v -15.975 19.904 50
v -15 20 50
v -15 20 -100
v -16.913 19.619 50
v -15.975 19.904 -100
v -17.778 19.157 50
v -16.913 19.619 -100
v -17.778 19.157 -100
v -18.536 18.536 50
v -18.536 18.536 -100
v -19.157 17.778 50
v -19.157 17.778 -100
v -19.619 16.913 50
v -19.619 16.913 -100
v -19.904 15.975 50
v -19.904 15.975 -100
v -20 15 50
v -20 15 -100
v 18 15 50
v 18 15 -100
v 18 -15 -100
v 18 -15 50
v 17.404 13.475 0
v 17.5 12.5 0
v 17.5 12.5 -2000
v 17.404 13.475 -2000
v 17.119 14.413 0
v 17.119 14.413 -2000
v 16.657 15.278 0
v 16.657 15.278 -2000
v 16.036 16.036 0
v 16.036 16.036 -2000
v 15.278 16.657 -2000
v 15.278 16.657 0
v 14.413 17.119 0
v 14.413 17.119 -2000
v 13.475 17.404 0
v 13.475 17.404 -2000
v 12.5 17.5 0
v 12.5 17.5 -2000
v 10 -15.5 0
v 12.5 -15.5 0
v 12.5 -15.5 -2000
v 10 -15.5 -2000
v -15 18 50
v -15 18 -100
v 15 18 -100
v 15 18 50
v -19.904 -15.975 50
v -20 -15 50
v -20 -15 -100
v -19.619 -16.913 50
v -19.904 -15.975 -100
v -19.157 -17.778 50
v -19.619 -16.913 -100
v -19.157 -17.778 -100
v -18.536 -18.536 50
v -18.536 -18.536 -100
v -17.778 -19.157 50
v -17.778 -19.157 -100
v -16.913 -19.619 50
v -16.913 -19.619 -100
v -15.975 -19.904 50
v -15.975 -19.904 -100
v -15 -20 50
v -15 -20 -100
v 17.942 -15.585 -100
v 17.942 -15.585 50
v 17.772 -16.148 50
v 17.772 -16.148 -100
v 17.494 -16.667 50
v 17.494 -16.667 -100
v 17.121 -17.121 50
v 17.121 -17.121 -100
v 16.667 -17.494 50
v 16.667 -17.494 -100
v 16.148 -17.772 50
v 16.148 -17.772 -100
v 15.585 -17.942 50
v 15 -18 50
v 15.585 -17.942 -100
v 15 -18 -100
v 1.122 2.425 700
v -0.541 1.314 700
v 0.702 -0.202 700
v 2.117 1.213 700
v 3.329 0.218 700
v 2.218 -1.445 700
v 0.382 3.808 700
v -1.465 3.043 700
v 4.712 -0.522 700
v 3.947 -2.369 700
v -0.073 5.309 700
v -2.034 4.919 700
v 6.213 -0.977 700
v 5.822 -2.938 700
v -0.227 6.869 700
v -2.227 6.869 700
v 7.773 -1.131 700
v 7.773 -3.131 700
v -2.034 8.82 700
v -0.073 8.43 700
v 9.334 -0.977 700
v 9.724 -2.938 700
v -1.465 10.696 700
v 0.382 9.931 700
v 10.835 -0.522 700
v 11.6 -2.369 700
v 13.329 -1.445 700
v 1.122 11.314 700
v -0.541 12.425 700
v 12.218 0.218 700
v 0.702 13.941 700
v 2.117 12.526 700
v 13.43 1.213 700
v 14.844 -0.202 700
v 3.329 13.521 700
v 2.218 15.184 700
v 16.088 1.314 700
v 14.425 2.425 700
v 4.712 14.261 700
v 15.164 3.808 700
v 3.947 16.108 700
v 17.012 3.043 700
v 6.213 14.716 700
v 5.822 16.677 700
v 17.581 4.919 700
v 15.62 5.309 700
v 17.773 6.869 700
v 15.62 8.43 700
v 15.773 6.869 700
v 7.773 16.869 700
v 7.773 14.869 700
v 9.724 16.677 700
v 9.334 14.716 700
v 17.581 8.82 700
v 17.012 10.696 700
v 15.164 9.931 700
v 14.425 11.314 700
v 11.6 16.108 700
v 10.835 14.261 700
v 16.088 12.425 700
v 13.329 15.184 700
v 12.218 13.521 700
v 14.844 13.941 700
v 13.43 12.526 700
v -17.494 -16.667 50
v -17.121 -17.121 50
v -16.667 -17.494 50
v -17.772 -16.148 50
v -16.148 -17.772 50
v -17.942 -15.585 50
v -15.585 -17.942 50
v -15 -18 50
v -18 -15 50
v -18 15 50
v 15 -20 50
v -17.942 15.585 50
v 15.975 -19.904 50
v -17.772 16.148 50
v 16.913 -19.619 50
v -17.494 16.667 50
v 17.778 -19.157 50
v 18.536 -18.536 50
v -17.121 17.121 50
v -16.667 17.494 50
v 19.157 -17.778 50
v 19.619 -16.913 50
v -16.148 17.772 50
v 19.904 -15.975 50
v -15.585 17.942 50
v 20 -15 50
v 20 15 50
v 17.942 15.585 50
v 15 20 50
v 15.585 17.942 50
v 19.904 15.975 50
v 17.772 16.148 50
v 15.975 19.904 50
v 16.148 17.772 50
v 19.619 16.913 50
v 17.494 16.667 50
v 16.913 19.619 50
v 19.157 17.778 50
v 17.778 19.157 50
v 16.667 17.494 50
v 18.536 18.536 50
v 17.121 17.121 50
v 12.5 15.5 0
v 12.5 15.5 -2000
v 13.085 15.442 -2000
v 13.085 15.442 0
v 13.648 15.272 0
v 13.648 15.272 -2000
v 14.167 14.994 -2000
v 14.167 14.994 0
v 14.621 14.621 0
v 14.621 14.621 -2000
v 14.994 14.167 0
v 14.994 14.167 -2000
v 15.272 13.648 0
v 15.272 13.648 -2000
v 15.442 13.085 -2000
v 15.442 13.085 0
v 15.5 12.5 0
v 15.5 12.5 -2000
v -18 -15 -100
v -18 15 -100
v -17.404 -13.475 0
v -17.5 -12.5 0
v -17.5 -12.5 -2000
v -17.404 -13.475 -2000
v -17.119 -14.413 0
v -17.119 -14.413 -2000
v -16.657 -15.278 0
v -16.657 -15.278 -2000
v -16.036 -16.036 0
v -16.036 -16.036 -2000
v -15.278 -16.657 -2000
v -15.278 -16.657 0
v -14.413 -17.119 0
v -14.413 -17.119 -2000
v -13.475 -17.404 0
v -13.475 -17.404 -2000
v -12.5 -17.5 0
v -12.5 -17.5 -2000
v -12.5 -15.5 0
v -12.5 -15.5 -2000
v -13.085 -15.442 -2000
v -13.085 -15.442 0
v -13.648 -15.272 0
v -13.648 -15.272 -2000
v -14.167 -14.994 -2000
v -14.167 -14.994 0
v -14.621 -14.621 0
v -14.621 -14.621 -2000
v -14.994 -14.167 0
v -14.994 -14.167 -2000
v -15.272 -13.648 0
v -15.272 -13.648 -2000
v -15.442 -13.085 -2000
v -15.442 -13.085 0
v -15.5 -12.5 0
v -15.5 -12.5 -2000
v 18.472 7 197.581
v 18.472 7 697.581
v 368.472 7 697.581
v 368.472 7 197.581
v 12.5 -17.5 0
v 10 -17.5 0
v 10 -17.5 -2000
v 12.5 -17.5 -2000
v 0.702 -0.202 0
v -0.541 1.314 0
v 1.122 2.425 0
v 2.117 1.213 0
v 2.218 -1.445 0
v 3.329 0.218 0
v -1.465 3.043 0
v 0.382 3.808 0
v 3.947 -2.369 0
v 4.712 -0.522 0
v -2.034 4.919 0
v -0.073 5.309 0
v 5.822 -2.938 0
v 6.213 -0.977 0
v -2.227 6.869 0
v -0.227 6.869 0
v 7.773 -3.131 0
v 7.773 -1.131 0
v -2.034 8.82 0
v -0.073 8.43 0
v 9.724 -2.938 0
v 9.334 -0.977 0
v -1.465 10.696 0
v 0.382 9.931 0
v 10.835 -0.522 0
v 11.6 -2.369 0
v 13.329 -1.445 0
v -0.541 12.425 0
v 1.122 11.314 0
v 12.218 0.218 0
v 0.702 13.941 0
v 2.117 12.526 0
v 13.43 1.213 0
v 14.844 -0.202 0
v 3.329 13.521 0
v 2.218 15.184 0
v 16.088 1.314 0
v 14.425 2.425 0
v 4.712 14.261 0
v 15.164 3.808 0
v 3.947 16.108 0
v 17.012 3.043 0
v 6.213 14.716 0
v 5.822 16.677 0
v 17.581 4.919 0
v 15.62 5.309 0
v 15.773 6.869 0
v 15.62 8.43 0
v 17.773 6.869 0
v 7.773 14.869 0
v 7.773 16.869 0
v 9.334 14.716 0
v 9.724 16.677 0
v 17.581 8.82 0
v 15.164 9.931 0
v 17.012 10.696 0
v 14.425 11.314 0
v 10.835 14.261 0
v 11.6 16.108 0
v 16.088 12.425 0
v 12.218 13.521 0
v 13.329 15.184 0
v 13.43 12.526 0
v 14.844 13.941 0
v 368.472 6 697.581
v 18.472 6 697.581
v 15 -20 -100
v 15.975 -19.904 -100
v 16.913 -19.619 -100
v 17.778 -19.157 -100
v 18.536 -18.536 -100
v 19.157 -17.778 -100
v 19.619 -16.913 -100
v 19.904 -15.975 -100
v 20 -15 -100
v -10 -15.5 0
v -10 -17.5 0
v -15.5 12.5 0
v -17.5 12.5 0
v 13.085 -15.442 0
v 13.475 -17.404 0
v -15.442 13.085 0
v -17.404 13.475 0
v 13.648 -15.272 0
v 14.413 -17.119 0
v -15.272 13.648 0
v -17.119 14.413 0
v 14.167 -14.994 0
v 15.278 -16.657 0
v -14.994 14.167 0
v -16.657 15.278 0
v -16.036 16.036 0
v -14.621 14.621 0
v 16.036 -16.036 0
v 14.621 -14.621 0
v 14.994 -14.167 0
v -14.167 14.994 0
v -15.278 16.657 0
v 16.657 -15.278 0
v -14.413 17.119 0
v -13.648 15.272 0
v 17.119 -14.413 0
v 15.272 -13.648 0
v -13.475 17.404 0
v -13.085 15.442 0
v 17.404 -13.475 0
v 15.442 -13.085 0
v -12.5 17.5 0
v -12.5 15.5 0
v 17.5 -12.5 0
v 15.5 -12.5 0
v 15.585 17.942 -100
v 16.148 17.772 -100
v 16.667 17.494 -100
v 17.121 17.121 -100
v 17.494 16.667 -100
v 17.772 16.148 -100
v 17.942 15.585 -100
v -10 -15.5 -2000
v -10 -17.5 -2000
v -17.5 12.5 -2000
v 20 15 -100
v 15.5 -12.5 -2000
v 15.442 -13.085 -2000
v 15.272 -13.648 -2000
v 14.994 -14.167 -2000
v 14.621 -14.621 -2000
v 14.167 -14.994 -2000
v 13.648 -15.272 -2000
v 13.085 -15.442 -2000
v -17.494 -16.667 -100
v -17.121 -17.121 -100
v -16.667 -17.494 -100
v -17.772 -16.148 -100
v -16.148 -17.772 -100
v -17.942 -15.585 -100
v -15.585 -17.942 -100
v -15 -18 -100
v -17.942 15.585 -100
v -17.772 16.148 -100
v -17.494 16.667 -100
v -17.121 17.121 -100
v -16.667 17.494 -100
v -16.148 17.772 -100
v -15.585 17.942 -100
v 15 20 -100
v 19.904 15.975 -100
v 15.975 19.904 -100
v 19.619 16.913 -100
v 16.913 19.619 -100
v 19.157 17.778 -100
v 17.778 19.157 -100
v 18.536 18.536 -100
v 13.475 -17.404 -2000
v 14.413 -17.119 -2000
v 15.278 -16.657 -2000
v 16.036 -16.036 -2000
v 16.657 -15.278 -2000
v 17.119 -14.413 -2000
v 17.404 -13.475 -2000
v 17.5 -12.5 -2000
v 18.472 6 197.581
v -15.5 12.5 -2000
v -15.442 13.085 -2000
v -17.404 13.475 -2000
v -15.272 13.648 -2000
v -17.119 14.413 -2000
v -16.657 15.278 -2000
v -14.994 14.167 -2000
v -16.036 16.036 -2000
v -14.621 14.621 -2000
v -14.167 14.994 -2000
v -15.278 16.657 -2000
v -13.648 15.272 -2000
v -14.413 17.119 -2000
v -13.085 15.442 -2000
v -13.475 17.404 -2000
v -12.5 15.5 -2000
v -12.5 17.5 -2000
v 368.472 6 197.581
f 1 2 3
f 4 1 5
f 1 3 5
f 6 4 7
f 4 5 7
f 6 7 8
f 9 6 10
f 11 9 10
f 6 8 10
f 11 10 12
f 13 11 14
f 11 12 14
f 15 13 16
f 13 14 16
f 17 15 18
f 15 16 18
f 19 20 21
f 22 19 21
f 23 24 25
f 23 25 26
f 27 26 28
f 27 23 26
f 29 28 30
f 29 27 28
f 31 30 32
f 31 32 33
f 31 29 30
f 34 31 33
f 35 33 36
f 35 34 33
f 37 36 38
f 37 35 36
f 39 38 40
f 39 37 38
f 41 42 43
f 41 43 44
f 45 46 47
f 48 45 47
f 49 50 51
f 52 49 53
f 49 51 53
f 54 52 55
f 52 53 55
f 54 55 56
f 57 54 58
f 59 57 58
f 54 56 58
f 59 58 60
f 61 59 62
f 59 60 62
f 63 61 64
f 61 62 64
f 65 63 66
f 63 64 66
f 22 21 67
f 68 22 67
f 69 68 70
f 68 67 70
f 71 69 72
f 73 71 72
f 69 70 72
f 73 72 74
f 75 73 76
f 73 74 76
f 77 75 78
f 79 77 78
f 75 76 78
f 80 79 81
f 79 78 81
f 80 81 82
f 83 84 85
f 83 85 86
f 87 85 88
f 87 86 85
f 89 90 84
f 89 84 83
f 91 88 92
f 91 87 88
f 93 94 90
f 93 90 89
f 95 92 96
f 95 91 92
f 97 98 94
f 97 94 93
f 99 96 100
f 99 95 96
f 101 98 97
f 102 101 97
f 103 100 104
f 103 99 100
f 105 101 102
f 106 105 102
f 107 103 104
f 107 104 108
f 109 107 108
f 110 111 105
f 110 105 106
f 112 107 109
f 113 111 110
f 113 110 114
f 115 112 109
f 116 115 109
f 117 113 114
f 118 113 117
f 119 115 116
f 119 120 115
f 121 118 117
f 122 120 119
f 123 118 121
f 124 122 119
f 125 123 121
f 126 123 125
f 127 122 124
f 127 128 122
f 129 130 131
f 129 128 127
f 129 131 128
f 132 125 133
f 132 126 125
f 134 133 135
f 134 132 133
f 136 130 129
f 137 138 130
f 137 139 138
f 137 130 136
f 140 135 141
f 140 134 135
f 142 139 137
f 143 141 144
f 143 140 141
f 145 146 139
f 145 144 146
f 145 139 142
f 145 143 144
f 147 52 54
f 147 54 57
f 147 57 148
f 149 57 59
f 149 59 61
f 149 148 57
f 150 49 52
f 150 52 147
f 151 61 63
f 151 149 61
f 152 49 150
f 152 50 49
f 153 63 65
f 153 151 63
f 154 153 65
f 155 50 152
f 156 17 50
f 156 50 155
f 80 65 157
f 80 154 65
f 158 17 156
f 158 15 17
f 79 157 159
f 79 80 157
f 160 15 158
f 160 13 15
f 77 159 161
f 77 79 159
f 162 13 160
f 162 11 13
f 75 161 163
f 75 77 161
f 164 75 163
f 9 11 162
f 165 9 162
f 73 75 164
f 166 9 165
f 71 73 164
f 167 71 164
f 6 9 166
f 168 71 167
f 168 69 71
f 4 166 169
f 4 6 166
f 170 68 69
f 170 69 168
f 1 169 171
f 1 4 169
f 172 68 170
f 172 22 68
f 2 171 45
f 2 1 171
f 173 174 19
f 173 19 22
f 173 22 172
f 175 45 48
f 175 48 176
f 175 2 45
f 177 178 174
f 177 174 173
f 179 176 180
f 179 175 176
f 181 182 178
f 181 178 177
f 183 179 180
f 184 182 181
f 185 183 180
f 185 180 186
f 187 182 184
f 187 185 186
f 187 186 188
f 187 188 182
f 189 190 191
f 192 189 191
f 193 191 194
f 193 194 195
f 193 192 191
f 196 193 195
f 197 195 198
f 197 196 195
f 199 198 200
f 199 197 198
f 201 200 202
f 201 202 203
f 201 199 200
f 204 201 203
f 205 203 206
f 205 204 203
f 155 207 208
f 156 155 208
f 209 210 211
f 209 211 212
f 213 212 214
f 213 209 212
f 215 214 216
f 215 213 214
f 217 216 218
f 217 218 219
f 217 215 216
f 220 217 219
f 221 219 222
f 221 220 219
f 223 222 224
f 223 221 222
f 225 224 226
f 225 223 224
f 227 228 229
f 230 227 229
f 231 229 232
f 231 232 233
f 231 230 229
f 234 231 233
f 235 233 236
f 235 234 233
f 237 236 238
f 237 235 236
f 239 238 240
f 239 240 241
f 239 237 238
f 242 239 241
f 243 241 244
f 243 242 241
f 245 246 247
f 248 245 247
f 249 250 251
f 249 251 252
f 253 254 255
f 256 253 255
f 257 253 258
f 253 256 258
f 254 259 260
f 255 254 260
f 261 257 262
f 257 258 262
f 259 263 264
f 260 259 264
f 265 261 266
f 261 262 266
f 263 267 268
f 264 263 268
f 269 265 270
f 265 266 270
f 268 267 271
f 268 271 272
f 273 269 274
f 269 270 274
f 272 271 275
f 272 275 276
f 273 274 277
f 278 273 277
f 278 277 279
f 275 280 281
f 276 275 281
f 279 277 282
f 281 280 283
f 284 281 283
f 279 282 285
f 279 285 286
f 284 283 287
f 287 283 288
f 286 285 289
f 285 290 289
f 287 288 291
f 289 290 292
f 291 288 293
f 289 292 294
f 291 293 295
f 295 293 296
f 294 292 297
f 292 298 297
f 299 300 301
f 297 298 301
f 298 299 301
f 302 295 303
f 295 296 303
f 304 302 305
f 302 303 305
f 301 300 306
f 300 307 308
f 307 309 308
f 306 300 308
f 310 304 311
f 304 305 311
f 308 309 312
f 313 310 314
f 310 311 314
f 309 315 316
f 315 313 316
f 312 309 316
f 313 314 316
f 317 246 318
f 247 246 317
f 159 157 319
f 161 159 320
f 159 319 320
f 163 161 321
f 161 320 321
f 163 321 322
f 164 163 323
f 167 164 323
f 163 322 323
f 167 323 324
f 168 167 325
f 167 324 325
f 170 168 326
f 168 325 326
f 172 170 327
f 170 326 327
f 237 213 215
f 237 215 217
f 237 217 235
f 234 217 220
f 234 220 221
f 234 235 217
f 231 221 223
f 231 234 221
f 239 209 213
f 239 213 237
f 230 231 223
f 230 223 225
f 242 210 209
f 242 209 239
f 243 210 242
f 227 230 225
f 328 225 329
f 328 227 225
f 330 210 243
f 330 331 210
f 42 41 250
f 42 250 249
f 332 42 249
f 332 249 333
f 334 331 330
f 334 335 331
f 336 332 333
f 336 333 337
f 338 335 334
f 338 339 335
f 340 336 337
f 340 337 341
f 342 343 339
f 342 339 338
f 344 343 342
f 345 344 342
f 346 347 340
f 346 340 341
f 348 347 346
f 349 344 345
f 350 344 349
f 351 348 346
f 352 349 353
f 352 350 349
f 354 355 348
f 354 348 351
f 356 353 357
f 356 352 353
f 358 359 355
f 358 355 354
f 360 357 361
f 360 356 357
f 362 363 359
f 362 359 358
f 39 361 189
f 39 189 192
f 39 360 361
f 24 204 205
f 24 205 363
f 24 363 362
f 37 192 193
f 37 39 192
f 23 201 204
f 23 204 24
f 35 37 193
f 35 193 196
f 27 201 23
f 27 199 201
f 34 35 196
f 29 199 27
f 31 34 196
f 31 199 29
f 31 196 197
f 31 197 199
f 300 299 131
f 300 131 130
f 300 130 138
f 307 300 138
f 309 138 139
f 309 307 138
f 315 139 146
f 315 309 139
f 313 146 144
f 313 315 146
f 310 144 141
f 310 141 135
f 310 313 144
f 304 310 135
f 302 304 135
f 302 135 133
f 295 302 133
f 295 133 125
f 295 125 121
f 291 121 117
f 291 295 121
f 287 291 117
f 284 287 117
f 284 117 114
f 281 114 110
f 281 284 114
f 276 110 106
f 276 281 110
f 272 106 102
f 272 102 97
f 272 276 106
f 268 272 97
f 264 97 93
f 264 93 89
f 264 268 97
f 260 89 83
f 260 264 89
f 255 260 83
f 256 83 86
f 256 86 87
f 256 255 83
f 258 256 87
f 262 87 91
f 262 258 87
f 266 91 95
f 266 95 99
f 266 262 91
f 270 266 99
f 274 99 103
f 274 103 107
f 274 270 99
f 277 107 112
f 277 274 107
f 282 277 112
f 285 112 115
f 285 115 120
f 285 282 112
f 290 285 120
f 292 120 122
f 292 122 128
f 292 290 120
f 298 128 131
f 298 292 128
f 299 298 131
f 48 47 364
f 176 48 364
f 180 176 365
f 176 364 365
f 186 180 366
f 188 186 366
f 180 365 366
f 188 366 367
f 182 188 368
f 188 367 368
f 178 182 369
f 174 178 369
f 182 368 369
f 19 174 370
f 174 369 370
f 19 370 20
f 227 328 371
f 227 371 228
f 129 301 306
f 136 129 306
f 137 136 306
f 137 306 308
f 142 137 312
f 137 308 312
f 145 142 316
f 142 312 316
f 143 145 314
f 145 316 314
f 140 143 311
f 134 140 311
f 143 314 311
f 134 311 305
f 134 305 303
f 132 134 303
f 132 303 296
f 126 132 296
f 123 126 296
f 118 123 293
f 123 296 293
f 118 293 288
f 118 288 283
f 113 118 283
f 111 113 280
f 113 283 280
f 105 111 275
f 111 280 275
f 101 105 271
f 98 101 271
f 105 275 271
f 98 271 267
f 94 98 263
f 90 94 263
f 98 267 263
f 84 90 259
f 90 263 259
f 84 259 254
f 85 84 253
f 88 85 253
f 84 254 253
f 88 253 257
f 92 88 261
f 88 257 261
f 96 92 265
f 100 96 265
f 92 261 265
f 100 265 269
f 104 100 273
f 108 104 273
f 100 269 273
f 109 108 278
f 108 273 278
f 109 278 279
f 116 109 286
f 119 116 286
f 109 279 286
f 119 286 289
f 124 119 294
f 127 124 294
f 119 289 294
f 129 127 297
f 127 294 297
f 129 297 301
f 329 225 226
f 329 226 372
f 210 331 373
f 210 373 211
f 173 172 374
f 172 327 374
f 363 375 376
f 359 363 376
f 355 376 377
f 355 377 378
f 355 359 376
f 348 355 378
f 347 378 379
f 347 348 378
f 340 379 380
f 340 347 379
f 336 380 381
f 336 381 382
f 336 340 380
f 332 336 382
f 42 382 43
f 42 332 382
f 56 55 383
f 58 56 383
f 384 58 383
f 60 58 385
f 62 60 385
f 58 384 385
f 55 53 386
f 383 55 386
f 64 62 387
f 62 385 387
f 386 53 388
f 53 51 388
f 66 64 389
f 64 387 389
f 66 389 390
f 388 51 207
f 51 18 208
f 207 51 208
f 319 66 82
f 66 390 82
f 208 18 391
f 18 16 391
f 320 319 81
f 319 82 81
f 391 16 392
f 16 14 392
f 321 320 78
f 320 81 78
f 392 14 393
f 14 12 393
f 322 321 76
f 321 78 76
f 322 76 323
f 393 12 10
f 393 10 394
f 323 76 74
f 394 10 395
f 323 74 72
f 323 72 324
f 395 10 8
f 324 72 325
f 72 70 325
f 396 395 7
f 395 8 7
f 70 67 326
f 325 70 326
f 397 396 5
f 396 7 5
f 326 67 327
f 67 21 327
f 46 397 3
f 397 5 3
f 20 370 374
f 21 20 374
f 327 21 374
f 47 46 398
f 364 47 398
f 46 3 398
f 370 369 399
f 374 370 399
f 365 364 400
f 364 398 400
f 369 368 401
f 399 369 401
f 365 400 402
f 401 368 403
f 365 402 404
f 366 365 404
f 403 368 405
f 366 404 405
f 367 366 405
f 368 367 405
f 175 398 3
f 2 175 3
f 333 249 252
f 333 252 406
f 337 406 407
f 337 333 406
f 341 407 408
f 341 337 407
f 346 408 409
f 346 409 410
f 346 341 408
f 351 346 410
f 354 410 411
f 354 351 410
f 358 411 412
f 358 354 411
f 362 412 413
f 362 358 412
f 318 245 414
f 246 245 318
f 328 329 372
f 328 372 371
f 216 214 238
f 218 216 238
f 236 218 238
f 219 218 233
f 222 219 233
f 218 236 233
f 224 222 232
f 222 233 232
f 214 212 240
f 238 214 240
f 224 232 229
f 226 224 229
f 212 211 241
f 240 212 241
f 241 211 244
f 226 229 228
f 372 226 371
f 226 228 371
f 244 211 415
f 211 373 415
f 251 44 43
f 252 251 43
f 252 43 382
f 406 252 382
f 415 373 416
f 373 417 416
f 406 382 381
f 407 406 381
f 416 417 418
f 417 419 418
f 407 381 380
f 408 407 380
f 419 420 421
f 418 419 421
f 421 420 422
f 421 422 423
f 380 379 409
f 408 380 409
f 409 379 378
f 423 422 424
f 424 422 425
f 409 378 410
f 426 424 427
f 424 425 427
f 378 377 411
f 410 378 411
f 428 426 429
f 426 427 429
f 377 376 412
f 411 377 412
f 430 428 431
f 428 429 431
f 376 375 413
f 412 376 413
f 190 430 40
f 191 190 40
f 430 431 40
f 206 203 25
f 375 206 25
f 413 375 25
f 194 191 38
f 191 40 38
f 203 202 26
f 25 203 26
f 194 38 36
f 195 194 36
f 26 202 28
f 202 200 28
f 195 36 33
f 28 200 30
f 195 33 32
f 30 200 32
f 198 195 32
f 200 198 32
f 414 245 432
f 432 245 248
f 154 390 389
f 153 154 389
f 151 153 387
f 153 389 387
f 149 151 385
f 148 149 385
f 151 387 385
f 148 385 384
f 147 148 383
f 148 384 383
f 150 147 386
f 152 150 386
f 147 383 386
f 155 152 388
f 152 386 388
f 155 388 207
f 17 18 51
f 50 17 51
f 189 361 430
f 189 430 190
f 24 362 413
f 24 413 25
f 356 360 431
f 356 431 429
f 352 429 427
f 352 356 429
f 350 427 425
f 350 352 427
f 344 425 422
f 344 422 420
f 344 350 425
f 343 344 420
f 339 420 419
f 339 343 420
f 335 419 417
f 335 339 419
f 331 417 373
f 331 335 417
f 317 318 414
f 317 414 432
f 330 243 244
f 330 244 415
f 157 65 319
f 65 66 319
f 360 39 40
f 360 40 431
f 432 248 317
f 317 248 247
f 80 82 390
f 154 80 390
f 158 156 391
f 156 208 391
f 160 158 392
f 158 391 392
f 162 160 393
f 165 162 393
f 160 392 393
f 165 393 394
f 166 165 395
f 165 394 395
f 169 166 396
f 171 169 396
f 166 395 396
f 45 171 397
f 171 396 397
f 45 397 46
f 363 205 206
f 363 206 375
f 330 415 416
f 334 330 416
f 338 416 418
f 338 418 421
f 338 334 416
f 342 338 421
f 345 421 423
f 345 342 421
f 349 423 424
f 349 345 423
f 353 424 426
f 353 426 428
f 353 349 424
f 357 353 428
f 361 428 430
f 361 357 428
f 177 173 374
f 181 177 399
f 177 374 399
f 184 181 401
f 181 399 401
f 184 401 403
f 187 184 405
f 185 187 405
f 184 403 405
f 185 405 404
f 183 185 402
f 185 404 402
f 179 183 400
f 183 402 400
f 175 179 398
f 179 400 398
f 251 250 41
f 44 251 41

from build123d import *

# Parameters (mm, degrees)
F1_DEPTH      = 2000
F2_W          = 20
F2_H          = 12.1004571627
F3_DEPTH      = 2000.001
F5_DEPTH      = 100
F5_DEPTH_BACK = 50
F6_R          = 10
F6_R_2        = 8
F7_DEPTH      = 700
F9_W          = 350
F9_H          = 500
F10_DEPTH     = 1


with BuildPart() as f1:
    # F0 (on Top) → F1 (new body)
    with BuildSketch(Plane.XY):
        with BuildLine():
            Line((-12.5, -17.5), (12.5, -17.5))
            ThreePointArc((12.5, -17.5), (16.0355339059, -16.0355339059), (17.5, -12.5))
            Line((17.5, -12.5), (17.5, 12.5))
            ThreePointArc((17.5, 12.5), (16.0355339059, 16.0355339059), (12.5, 17.5))
            Line((12.5, 17.5), (-12.5, 17.5))
            ThreePointArc((-12.5, 17.5), (-16.0355339059, 16.0355339059), (-17.5, 12.5))
            Line((-17.5, 12.5), (-17.5, -12.5))
            ThreePointArc((-17.5, -12.5), (-16.0355339059, -16.0355339059), (-12.5, -17.5))
        make_face()
        with BuildLine():
            ThreePointArc((-12.5, -15.5), (-14.6213203436, -14.6213203436), (-15.5, -12.5))
            Line((-15.5, -12.5), (-15.5, 12.5))
            ThreePointArc((-15.5, 12.5), (-14.6213203436, 14.6213203436), (-12.5, 15.5))
            Line((-12.5, 15.5), (12.5, 15.5))
            ThreePointArc((12.5, 15.5), (14.6213203436, 14.6213203436), (15.5, 12.5))
            Line((15.5, 12.5), (15.5, -12.5))
            ThreePointArc((15.5, -12.5), (14.6213203436, -14.6213203436), (12.5, -15.5))
            Line((12.5, -15.5), (-12.5, -15.5))
        make_face(mode=Mode.SUBTRACT)
    extrude(amount=-F1_DEPTH)

    # F2 (on Top) → F3 (cut, through all)
    with BuildSketch(Plane.XY):
        with Locations((0, -17.213780956)):
            Rectangle(F2_W, F2_H)
    extrude(amount=-F3_DEPTH, mode=Mode.SUBTRACT)


with BuildPart() as f5:
    # F4 (on Top) → F5 (new body, two sides)
    with BuildSketch(Plane.XY) as f5_sk:
        with BuildLine():
            ThreePointArc((-20, -15), (-18.5355339059, -18.5355339059), (-15, -20))
            Line((-15, -20), (15, -20))
            ThreePointArc((15, -20), (18.5355339059, -18.5355339059), (20, -15))
            Line((20, -15), (20, 15))
            ThreePointArc((20, 15), (18.5355339059, 18.5355339059), (15, 20))
            Line((15, 20), (-15, 20))
            ThreePointArc((-15, 20), (-18.5355339059, 18.5355339059), (-20, 15))
            Line((-20, 15), (-20, -15))
        make_face()
        with BuildLine():
            ThreePointArc((-18, 15), (-17.1213203436, 17.1213203436), (-15, 18))
            Line((-15, 18), (15, 18))
            ThreePointArc((15, 18), (17.1213203436, 17.1213203436), (18, 15))
            Line((18, 15), (18, -15))
            ThreePointArc((18, -15), (17.1213203436, -17.1213203436), (15, -18))
            Line((15, -18), (-15, -18))
            ThreePointArc((-15, -18), (-17.1213203436, -17.1213203436), (-18, -15))
            Line((-18, -15), (-18, 15))
        make_face(mode=Mode.SUBTRACT)
    extrude(amount=-F5_DEPTH)
    extrude(f5_sk.sketch, amount=F5_DEPTH_BACK)


with BuildPart() as f7:
    # F6 (on Top) → F7 (new body)
    with BuildSketch(Plane.XY):
        with Locations((7.7733634863, 6.8694764307)):
            Circle(F6_R)
        with Locations((7.7733634863, 6.8694764307)):
            Circle(F6_R_2, mode=Mode.SUBTRACT)
    extrude(amount=F7_DEPTH)


with BuildPart() as f10:
    # F9 (on offset) → F10 (new body)
    with BuildSketch(Plane.XZ.offset(-7)):
        with Locations((193.4722058475, 447.5811362267)):
            Rectangle(F9_W, F9_H)
    extrude(amount=F10_DEPTH)


solid = Compound([f1.part, f5.part, f7.part, f10.part])
